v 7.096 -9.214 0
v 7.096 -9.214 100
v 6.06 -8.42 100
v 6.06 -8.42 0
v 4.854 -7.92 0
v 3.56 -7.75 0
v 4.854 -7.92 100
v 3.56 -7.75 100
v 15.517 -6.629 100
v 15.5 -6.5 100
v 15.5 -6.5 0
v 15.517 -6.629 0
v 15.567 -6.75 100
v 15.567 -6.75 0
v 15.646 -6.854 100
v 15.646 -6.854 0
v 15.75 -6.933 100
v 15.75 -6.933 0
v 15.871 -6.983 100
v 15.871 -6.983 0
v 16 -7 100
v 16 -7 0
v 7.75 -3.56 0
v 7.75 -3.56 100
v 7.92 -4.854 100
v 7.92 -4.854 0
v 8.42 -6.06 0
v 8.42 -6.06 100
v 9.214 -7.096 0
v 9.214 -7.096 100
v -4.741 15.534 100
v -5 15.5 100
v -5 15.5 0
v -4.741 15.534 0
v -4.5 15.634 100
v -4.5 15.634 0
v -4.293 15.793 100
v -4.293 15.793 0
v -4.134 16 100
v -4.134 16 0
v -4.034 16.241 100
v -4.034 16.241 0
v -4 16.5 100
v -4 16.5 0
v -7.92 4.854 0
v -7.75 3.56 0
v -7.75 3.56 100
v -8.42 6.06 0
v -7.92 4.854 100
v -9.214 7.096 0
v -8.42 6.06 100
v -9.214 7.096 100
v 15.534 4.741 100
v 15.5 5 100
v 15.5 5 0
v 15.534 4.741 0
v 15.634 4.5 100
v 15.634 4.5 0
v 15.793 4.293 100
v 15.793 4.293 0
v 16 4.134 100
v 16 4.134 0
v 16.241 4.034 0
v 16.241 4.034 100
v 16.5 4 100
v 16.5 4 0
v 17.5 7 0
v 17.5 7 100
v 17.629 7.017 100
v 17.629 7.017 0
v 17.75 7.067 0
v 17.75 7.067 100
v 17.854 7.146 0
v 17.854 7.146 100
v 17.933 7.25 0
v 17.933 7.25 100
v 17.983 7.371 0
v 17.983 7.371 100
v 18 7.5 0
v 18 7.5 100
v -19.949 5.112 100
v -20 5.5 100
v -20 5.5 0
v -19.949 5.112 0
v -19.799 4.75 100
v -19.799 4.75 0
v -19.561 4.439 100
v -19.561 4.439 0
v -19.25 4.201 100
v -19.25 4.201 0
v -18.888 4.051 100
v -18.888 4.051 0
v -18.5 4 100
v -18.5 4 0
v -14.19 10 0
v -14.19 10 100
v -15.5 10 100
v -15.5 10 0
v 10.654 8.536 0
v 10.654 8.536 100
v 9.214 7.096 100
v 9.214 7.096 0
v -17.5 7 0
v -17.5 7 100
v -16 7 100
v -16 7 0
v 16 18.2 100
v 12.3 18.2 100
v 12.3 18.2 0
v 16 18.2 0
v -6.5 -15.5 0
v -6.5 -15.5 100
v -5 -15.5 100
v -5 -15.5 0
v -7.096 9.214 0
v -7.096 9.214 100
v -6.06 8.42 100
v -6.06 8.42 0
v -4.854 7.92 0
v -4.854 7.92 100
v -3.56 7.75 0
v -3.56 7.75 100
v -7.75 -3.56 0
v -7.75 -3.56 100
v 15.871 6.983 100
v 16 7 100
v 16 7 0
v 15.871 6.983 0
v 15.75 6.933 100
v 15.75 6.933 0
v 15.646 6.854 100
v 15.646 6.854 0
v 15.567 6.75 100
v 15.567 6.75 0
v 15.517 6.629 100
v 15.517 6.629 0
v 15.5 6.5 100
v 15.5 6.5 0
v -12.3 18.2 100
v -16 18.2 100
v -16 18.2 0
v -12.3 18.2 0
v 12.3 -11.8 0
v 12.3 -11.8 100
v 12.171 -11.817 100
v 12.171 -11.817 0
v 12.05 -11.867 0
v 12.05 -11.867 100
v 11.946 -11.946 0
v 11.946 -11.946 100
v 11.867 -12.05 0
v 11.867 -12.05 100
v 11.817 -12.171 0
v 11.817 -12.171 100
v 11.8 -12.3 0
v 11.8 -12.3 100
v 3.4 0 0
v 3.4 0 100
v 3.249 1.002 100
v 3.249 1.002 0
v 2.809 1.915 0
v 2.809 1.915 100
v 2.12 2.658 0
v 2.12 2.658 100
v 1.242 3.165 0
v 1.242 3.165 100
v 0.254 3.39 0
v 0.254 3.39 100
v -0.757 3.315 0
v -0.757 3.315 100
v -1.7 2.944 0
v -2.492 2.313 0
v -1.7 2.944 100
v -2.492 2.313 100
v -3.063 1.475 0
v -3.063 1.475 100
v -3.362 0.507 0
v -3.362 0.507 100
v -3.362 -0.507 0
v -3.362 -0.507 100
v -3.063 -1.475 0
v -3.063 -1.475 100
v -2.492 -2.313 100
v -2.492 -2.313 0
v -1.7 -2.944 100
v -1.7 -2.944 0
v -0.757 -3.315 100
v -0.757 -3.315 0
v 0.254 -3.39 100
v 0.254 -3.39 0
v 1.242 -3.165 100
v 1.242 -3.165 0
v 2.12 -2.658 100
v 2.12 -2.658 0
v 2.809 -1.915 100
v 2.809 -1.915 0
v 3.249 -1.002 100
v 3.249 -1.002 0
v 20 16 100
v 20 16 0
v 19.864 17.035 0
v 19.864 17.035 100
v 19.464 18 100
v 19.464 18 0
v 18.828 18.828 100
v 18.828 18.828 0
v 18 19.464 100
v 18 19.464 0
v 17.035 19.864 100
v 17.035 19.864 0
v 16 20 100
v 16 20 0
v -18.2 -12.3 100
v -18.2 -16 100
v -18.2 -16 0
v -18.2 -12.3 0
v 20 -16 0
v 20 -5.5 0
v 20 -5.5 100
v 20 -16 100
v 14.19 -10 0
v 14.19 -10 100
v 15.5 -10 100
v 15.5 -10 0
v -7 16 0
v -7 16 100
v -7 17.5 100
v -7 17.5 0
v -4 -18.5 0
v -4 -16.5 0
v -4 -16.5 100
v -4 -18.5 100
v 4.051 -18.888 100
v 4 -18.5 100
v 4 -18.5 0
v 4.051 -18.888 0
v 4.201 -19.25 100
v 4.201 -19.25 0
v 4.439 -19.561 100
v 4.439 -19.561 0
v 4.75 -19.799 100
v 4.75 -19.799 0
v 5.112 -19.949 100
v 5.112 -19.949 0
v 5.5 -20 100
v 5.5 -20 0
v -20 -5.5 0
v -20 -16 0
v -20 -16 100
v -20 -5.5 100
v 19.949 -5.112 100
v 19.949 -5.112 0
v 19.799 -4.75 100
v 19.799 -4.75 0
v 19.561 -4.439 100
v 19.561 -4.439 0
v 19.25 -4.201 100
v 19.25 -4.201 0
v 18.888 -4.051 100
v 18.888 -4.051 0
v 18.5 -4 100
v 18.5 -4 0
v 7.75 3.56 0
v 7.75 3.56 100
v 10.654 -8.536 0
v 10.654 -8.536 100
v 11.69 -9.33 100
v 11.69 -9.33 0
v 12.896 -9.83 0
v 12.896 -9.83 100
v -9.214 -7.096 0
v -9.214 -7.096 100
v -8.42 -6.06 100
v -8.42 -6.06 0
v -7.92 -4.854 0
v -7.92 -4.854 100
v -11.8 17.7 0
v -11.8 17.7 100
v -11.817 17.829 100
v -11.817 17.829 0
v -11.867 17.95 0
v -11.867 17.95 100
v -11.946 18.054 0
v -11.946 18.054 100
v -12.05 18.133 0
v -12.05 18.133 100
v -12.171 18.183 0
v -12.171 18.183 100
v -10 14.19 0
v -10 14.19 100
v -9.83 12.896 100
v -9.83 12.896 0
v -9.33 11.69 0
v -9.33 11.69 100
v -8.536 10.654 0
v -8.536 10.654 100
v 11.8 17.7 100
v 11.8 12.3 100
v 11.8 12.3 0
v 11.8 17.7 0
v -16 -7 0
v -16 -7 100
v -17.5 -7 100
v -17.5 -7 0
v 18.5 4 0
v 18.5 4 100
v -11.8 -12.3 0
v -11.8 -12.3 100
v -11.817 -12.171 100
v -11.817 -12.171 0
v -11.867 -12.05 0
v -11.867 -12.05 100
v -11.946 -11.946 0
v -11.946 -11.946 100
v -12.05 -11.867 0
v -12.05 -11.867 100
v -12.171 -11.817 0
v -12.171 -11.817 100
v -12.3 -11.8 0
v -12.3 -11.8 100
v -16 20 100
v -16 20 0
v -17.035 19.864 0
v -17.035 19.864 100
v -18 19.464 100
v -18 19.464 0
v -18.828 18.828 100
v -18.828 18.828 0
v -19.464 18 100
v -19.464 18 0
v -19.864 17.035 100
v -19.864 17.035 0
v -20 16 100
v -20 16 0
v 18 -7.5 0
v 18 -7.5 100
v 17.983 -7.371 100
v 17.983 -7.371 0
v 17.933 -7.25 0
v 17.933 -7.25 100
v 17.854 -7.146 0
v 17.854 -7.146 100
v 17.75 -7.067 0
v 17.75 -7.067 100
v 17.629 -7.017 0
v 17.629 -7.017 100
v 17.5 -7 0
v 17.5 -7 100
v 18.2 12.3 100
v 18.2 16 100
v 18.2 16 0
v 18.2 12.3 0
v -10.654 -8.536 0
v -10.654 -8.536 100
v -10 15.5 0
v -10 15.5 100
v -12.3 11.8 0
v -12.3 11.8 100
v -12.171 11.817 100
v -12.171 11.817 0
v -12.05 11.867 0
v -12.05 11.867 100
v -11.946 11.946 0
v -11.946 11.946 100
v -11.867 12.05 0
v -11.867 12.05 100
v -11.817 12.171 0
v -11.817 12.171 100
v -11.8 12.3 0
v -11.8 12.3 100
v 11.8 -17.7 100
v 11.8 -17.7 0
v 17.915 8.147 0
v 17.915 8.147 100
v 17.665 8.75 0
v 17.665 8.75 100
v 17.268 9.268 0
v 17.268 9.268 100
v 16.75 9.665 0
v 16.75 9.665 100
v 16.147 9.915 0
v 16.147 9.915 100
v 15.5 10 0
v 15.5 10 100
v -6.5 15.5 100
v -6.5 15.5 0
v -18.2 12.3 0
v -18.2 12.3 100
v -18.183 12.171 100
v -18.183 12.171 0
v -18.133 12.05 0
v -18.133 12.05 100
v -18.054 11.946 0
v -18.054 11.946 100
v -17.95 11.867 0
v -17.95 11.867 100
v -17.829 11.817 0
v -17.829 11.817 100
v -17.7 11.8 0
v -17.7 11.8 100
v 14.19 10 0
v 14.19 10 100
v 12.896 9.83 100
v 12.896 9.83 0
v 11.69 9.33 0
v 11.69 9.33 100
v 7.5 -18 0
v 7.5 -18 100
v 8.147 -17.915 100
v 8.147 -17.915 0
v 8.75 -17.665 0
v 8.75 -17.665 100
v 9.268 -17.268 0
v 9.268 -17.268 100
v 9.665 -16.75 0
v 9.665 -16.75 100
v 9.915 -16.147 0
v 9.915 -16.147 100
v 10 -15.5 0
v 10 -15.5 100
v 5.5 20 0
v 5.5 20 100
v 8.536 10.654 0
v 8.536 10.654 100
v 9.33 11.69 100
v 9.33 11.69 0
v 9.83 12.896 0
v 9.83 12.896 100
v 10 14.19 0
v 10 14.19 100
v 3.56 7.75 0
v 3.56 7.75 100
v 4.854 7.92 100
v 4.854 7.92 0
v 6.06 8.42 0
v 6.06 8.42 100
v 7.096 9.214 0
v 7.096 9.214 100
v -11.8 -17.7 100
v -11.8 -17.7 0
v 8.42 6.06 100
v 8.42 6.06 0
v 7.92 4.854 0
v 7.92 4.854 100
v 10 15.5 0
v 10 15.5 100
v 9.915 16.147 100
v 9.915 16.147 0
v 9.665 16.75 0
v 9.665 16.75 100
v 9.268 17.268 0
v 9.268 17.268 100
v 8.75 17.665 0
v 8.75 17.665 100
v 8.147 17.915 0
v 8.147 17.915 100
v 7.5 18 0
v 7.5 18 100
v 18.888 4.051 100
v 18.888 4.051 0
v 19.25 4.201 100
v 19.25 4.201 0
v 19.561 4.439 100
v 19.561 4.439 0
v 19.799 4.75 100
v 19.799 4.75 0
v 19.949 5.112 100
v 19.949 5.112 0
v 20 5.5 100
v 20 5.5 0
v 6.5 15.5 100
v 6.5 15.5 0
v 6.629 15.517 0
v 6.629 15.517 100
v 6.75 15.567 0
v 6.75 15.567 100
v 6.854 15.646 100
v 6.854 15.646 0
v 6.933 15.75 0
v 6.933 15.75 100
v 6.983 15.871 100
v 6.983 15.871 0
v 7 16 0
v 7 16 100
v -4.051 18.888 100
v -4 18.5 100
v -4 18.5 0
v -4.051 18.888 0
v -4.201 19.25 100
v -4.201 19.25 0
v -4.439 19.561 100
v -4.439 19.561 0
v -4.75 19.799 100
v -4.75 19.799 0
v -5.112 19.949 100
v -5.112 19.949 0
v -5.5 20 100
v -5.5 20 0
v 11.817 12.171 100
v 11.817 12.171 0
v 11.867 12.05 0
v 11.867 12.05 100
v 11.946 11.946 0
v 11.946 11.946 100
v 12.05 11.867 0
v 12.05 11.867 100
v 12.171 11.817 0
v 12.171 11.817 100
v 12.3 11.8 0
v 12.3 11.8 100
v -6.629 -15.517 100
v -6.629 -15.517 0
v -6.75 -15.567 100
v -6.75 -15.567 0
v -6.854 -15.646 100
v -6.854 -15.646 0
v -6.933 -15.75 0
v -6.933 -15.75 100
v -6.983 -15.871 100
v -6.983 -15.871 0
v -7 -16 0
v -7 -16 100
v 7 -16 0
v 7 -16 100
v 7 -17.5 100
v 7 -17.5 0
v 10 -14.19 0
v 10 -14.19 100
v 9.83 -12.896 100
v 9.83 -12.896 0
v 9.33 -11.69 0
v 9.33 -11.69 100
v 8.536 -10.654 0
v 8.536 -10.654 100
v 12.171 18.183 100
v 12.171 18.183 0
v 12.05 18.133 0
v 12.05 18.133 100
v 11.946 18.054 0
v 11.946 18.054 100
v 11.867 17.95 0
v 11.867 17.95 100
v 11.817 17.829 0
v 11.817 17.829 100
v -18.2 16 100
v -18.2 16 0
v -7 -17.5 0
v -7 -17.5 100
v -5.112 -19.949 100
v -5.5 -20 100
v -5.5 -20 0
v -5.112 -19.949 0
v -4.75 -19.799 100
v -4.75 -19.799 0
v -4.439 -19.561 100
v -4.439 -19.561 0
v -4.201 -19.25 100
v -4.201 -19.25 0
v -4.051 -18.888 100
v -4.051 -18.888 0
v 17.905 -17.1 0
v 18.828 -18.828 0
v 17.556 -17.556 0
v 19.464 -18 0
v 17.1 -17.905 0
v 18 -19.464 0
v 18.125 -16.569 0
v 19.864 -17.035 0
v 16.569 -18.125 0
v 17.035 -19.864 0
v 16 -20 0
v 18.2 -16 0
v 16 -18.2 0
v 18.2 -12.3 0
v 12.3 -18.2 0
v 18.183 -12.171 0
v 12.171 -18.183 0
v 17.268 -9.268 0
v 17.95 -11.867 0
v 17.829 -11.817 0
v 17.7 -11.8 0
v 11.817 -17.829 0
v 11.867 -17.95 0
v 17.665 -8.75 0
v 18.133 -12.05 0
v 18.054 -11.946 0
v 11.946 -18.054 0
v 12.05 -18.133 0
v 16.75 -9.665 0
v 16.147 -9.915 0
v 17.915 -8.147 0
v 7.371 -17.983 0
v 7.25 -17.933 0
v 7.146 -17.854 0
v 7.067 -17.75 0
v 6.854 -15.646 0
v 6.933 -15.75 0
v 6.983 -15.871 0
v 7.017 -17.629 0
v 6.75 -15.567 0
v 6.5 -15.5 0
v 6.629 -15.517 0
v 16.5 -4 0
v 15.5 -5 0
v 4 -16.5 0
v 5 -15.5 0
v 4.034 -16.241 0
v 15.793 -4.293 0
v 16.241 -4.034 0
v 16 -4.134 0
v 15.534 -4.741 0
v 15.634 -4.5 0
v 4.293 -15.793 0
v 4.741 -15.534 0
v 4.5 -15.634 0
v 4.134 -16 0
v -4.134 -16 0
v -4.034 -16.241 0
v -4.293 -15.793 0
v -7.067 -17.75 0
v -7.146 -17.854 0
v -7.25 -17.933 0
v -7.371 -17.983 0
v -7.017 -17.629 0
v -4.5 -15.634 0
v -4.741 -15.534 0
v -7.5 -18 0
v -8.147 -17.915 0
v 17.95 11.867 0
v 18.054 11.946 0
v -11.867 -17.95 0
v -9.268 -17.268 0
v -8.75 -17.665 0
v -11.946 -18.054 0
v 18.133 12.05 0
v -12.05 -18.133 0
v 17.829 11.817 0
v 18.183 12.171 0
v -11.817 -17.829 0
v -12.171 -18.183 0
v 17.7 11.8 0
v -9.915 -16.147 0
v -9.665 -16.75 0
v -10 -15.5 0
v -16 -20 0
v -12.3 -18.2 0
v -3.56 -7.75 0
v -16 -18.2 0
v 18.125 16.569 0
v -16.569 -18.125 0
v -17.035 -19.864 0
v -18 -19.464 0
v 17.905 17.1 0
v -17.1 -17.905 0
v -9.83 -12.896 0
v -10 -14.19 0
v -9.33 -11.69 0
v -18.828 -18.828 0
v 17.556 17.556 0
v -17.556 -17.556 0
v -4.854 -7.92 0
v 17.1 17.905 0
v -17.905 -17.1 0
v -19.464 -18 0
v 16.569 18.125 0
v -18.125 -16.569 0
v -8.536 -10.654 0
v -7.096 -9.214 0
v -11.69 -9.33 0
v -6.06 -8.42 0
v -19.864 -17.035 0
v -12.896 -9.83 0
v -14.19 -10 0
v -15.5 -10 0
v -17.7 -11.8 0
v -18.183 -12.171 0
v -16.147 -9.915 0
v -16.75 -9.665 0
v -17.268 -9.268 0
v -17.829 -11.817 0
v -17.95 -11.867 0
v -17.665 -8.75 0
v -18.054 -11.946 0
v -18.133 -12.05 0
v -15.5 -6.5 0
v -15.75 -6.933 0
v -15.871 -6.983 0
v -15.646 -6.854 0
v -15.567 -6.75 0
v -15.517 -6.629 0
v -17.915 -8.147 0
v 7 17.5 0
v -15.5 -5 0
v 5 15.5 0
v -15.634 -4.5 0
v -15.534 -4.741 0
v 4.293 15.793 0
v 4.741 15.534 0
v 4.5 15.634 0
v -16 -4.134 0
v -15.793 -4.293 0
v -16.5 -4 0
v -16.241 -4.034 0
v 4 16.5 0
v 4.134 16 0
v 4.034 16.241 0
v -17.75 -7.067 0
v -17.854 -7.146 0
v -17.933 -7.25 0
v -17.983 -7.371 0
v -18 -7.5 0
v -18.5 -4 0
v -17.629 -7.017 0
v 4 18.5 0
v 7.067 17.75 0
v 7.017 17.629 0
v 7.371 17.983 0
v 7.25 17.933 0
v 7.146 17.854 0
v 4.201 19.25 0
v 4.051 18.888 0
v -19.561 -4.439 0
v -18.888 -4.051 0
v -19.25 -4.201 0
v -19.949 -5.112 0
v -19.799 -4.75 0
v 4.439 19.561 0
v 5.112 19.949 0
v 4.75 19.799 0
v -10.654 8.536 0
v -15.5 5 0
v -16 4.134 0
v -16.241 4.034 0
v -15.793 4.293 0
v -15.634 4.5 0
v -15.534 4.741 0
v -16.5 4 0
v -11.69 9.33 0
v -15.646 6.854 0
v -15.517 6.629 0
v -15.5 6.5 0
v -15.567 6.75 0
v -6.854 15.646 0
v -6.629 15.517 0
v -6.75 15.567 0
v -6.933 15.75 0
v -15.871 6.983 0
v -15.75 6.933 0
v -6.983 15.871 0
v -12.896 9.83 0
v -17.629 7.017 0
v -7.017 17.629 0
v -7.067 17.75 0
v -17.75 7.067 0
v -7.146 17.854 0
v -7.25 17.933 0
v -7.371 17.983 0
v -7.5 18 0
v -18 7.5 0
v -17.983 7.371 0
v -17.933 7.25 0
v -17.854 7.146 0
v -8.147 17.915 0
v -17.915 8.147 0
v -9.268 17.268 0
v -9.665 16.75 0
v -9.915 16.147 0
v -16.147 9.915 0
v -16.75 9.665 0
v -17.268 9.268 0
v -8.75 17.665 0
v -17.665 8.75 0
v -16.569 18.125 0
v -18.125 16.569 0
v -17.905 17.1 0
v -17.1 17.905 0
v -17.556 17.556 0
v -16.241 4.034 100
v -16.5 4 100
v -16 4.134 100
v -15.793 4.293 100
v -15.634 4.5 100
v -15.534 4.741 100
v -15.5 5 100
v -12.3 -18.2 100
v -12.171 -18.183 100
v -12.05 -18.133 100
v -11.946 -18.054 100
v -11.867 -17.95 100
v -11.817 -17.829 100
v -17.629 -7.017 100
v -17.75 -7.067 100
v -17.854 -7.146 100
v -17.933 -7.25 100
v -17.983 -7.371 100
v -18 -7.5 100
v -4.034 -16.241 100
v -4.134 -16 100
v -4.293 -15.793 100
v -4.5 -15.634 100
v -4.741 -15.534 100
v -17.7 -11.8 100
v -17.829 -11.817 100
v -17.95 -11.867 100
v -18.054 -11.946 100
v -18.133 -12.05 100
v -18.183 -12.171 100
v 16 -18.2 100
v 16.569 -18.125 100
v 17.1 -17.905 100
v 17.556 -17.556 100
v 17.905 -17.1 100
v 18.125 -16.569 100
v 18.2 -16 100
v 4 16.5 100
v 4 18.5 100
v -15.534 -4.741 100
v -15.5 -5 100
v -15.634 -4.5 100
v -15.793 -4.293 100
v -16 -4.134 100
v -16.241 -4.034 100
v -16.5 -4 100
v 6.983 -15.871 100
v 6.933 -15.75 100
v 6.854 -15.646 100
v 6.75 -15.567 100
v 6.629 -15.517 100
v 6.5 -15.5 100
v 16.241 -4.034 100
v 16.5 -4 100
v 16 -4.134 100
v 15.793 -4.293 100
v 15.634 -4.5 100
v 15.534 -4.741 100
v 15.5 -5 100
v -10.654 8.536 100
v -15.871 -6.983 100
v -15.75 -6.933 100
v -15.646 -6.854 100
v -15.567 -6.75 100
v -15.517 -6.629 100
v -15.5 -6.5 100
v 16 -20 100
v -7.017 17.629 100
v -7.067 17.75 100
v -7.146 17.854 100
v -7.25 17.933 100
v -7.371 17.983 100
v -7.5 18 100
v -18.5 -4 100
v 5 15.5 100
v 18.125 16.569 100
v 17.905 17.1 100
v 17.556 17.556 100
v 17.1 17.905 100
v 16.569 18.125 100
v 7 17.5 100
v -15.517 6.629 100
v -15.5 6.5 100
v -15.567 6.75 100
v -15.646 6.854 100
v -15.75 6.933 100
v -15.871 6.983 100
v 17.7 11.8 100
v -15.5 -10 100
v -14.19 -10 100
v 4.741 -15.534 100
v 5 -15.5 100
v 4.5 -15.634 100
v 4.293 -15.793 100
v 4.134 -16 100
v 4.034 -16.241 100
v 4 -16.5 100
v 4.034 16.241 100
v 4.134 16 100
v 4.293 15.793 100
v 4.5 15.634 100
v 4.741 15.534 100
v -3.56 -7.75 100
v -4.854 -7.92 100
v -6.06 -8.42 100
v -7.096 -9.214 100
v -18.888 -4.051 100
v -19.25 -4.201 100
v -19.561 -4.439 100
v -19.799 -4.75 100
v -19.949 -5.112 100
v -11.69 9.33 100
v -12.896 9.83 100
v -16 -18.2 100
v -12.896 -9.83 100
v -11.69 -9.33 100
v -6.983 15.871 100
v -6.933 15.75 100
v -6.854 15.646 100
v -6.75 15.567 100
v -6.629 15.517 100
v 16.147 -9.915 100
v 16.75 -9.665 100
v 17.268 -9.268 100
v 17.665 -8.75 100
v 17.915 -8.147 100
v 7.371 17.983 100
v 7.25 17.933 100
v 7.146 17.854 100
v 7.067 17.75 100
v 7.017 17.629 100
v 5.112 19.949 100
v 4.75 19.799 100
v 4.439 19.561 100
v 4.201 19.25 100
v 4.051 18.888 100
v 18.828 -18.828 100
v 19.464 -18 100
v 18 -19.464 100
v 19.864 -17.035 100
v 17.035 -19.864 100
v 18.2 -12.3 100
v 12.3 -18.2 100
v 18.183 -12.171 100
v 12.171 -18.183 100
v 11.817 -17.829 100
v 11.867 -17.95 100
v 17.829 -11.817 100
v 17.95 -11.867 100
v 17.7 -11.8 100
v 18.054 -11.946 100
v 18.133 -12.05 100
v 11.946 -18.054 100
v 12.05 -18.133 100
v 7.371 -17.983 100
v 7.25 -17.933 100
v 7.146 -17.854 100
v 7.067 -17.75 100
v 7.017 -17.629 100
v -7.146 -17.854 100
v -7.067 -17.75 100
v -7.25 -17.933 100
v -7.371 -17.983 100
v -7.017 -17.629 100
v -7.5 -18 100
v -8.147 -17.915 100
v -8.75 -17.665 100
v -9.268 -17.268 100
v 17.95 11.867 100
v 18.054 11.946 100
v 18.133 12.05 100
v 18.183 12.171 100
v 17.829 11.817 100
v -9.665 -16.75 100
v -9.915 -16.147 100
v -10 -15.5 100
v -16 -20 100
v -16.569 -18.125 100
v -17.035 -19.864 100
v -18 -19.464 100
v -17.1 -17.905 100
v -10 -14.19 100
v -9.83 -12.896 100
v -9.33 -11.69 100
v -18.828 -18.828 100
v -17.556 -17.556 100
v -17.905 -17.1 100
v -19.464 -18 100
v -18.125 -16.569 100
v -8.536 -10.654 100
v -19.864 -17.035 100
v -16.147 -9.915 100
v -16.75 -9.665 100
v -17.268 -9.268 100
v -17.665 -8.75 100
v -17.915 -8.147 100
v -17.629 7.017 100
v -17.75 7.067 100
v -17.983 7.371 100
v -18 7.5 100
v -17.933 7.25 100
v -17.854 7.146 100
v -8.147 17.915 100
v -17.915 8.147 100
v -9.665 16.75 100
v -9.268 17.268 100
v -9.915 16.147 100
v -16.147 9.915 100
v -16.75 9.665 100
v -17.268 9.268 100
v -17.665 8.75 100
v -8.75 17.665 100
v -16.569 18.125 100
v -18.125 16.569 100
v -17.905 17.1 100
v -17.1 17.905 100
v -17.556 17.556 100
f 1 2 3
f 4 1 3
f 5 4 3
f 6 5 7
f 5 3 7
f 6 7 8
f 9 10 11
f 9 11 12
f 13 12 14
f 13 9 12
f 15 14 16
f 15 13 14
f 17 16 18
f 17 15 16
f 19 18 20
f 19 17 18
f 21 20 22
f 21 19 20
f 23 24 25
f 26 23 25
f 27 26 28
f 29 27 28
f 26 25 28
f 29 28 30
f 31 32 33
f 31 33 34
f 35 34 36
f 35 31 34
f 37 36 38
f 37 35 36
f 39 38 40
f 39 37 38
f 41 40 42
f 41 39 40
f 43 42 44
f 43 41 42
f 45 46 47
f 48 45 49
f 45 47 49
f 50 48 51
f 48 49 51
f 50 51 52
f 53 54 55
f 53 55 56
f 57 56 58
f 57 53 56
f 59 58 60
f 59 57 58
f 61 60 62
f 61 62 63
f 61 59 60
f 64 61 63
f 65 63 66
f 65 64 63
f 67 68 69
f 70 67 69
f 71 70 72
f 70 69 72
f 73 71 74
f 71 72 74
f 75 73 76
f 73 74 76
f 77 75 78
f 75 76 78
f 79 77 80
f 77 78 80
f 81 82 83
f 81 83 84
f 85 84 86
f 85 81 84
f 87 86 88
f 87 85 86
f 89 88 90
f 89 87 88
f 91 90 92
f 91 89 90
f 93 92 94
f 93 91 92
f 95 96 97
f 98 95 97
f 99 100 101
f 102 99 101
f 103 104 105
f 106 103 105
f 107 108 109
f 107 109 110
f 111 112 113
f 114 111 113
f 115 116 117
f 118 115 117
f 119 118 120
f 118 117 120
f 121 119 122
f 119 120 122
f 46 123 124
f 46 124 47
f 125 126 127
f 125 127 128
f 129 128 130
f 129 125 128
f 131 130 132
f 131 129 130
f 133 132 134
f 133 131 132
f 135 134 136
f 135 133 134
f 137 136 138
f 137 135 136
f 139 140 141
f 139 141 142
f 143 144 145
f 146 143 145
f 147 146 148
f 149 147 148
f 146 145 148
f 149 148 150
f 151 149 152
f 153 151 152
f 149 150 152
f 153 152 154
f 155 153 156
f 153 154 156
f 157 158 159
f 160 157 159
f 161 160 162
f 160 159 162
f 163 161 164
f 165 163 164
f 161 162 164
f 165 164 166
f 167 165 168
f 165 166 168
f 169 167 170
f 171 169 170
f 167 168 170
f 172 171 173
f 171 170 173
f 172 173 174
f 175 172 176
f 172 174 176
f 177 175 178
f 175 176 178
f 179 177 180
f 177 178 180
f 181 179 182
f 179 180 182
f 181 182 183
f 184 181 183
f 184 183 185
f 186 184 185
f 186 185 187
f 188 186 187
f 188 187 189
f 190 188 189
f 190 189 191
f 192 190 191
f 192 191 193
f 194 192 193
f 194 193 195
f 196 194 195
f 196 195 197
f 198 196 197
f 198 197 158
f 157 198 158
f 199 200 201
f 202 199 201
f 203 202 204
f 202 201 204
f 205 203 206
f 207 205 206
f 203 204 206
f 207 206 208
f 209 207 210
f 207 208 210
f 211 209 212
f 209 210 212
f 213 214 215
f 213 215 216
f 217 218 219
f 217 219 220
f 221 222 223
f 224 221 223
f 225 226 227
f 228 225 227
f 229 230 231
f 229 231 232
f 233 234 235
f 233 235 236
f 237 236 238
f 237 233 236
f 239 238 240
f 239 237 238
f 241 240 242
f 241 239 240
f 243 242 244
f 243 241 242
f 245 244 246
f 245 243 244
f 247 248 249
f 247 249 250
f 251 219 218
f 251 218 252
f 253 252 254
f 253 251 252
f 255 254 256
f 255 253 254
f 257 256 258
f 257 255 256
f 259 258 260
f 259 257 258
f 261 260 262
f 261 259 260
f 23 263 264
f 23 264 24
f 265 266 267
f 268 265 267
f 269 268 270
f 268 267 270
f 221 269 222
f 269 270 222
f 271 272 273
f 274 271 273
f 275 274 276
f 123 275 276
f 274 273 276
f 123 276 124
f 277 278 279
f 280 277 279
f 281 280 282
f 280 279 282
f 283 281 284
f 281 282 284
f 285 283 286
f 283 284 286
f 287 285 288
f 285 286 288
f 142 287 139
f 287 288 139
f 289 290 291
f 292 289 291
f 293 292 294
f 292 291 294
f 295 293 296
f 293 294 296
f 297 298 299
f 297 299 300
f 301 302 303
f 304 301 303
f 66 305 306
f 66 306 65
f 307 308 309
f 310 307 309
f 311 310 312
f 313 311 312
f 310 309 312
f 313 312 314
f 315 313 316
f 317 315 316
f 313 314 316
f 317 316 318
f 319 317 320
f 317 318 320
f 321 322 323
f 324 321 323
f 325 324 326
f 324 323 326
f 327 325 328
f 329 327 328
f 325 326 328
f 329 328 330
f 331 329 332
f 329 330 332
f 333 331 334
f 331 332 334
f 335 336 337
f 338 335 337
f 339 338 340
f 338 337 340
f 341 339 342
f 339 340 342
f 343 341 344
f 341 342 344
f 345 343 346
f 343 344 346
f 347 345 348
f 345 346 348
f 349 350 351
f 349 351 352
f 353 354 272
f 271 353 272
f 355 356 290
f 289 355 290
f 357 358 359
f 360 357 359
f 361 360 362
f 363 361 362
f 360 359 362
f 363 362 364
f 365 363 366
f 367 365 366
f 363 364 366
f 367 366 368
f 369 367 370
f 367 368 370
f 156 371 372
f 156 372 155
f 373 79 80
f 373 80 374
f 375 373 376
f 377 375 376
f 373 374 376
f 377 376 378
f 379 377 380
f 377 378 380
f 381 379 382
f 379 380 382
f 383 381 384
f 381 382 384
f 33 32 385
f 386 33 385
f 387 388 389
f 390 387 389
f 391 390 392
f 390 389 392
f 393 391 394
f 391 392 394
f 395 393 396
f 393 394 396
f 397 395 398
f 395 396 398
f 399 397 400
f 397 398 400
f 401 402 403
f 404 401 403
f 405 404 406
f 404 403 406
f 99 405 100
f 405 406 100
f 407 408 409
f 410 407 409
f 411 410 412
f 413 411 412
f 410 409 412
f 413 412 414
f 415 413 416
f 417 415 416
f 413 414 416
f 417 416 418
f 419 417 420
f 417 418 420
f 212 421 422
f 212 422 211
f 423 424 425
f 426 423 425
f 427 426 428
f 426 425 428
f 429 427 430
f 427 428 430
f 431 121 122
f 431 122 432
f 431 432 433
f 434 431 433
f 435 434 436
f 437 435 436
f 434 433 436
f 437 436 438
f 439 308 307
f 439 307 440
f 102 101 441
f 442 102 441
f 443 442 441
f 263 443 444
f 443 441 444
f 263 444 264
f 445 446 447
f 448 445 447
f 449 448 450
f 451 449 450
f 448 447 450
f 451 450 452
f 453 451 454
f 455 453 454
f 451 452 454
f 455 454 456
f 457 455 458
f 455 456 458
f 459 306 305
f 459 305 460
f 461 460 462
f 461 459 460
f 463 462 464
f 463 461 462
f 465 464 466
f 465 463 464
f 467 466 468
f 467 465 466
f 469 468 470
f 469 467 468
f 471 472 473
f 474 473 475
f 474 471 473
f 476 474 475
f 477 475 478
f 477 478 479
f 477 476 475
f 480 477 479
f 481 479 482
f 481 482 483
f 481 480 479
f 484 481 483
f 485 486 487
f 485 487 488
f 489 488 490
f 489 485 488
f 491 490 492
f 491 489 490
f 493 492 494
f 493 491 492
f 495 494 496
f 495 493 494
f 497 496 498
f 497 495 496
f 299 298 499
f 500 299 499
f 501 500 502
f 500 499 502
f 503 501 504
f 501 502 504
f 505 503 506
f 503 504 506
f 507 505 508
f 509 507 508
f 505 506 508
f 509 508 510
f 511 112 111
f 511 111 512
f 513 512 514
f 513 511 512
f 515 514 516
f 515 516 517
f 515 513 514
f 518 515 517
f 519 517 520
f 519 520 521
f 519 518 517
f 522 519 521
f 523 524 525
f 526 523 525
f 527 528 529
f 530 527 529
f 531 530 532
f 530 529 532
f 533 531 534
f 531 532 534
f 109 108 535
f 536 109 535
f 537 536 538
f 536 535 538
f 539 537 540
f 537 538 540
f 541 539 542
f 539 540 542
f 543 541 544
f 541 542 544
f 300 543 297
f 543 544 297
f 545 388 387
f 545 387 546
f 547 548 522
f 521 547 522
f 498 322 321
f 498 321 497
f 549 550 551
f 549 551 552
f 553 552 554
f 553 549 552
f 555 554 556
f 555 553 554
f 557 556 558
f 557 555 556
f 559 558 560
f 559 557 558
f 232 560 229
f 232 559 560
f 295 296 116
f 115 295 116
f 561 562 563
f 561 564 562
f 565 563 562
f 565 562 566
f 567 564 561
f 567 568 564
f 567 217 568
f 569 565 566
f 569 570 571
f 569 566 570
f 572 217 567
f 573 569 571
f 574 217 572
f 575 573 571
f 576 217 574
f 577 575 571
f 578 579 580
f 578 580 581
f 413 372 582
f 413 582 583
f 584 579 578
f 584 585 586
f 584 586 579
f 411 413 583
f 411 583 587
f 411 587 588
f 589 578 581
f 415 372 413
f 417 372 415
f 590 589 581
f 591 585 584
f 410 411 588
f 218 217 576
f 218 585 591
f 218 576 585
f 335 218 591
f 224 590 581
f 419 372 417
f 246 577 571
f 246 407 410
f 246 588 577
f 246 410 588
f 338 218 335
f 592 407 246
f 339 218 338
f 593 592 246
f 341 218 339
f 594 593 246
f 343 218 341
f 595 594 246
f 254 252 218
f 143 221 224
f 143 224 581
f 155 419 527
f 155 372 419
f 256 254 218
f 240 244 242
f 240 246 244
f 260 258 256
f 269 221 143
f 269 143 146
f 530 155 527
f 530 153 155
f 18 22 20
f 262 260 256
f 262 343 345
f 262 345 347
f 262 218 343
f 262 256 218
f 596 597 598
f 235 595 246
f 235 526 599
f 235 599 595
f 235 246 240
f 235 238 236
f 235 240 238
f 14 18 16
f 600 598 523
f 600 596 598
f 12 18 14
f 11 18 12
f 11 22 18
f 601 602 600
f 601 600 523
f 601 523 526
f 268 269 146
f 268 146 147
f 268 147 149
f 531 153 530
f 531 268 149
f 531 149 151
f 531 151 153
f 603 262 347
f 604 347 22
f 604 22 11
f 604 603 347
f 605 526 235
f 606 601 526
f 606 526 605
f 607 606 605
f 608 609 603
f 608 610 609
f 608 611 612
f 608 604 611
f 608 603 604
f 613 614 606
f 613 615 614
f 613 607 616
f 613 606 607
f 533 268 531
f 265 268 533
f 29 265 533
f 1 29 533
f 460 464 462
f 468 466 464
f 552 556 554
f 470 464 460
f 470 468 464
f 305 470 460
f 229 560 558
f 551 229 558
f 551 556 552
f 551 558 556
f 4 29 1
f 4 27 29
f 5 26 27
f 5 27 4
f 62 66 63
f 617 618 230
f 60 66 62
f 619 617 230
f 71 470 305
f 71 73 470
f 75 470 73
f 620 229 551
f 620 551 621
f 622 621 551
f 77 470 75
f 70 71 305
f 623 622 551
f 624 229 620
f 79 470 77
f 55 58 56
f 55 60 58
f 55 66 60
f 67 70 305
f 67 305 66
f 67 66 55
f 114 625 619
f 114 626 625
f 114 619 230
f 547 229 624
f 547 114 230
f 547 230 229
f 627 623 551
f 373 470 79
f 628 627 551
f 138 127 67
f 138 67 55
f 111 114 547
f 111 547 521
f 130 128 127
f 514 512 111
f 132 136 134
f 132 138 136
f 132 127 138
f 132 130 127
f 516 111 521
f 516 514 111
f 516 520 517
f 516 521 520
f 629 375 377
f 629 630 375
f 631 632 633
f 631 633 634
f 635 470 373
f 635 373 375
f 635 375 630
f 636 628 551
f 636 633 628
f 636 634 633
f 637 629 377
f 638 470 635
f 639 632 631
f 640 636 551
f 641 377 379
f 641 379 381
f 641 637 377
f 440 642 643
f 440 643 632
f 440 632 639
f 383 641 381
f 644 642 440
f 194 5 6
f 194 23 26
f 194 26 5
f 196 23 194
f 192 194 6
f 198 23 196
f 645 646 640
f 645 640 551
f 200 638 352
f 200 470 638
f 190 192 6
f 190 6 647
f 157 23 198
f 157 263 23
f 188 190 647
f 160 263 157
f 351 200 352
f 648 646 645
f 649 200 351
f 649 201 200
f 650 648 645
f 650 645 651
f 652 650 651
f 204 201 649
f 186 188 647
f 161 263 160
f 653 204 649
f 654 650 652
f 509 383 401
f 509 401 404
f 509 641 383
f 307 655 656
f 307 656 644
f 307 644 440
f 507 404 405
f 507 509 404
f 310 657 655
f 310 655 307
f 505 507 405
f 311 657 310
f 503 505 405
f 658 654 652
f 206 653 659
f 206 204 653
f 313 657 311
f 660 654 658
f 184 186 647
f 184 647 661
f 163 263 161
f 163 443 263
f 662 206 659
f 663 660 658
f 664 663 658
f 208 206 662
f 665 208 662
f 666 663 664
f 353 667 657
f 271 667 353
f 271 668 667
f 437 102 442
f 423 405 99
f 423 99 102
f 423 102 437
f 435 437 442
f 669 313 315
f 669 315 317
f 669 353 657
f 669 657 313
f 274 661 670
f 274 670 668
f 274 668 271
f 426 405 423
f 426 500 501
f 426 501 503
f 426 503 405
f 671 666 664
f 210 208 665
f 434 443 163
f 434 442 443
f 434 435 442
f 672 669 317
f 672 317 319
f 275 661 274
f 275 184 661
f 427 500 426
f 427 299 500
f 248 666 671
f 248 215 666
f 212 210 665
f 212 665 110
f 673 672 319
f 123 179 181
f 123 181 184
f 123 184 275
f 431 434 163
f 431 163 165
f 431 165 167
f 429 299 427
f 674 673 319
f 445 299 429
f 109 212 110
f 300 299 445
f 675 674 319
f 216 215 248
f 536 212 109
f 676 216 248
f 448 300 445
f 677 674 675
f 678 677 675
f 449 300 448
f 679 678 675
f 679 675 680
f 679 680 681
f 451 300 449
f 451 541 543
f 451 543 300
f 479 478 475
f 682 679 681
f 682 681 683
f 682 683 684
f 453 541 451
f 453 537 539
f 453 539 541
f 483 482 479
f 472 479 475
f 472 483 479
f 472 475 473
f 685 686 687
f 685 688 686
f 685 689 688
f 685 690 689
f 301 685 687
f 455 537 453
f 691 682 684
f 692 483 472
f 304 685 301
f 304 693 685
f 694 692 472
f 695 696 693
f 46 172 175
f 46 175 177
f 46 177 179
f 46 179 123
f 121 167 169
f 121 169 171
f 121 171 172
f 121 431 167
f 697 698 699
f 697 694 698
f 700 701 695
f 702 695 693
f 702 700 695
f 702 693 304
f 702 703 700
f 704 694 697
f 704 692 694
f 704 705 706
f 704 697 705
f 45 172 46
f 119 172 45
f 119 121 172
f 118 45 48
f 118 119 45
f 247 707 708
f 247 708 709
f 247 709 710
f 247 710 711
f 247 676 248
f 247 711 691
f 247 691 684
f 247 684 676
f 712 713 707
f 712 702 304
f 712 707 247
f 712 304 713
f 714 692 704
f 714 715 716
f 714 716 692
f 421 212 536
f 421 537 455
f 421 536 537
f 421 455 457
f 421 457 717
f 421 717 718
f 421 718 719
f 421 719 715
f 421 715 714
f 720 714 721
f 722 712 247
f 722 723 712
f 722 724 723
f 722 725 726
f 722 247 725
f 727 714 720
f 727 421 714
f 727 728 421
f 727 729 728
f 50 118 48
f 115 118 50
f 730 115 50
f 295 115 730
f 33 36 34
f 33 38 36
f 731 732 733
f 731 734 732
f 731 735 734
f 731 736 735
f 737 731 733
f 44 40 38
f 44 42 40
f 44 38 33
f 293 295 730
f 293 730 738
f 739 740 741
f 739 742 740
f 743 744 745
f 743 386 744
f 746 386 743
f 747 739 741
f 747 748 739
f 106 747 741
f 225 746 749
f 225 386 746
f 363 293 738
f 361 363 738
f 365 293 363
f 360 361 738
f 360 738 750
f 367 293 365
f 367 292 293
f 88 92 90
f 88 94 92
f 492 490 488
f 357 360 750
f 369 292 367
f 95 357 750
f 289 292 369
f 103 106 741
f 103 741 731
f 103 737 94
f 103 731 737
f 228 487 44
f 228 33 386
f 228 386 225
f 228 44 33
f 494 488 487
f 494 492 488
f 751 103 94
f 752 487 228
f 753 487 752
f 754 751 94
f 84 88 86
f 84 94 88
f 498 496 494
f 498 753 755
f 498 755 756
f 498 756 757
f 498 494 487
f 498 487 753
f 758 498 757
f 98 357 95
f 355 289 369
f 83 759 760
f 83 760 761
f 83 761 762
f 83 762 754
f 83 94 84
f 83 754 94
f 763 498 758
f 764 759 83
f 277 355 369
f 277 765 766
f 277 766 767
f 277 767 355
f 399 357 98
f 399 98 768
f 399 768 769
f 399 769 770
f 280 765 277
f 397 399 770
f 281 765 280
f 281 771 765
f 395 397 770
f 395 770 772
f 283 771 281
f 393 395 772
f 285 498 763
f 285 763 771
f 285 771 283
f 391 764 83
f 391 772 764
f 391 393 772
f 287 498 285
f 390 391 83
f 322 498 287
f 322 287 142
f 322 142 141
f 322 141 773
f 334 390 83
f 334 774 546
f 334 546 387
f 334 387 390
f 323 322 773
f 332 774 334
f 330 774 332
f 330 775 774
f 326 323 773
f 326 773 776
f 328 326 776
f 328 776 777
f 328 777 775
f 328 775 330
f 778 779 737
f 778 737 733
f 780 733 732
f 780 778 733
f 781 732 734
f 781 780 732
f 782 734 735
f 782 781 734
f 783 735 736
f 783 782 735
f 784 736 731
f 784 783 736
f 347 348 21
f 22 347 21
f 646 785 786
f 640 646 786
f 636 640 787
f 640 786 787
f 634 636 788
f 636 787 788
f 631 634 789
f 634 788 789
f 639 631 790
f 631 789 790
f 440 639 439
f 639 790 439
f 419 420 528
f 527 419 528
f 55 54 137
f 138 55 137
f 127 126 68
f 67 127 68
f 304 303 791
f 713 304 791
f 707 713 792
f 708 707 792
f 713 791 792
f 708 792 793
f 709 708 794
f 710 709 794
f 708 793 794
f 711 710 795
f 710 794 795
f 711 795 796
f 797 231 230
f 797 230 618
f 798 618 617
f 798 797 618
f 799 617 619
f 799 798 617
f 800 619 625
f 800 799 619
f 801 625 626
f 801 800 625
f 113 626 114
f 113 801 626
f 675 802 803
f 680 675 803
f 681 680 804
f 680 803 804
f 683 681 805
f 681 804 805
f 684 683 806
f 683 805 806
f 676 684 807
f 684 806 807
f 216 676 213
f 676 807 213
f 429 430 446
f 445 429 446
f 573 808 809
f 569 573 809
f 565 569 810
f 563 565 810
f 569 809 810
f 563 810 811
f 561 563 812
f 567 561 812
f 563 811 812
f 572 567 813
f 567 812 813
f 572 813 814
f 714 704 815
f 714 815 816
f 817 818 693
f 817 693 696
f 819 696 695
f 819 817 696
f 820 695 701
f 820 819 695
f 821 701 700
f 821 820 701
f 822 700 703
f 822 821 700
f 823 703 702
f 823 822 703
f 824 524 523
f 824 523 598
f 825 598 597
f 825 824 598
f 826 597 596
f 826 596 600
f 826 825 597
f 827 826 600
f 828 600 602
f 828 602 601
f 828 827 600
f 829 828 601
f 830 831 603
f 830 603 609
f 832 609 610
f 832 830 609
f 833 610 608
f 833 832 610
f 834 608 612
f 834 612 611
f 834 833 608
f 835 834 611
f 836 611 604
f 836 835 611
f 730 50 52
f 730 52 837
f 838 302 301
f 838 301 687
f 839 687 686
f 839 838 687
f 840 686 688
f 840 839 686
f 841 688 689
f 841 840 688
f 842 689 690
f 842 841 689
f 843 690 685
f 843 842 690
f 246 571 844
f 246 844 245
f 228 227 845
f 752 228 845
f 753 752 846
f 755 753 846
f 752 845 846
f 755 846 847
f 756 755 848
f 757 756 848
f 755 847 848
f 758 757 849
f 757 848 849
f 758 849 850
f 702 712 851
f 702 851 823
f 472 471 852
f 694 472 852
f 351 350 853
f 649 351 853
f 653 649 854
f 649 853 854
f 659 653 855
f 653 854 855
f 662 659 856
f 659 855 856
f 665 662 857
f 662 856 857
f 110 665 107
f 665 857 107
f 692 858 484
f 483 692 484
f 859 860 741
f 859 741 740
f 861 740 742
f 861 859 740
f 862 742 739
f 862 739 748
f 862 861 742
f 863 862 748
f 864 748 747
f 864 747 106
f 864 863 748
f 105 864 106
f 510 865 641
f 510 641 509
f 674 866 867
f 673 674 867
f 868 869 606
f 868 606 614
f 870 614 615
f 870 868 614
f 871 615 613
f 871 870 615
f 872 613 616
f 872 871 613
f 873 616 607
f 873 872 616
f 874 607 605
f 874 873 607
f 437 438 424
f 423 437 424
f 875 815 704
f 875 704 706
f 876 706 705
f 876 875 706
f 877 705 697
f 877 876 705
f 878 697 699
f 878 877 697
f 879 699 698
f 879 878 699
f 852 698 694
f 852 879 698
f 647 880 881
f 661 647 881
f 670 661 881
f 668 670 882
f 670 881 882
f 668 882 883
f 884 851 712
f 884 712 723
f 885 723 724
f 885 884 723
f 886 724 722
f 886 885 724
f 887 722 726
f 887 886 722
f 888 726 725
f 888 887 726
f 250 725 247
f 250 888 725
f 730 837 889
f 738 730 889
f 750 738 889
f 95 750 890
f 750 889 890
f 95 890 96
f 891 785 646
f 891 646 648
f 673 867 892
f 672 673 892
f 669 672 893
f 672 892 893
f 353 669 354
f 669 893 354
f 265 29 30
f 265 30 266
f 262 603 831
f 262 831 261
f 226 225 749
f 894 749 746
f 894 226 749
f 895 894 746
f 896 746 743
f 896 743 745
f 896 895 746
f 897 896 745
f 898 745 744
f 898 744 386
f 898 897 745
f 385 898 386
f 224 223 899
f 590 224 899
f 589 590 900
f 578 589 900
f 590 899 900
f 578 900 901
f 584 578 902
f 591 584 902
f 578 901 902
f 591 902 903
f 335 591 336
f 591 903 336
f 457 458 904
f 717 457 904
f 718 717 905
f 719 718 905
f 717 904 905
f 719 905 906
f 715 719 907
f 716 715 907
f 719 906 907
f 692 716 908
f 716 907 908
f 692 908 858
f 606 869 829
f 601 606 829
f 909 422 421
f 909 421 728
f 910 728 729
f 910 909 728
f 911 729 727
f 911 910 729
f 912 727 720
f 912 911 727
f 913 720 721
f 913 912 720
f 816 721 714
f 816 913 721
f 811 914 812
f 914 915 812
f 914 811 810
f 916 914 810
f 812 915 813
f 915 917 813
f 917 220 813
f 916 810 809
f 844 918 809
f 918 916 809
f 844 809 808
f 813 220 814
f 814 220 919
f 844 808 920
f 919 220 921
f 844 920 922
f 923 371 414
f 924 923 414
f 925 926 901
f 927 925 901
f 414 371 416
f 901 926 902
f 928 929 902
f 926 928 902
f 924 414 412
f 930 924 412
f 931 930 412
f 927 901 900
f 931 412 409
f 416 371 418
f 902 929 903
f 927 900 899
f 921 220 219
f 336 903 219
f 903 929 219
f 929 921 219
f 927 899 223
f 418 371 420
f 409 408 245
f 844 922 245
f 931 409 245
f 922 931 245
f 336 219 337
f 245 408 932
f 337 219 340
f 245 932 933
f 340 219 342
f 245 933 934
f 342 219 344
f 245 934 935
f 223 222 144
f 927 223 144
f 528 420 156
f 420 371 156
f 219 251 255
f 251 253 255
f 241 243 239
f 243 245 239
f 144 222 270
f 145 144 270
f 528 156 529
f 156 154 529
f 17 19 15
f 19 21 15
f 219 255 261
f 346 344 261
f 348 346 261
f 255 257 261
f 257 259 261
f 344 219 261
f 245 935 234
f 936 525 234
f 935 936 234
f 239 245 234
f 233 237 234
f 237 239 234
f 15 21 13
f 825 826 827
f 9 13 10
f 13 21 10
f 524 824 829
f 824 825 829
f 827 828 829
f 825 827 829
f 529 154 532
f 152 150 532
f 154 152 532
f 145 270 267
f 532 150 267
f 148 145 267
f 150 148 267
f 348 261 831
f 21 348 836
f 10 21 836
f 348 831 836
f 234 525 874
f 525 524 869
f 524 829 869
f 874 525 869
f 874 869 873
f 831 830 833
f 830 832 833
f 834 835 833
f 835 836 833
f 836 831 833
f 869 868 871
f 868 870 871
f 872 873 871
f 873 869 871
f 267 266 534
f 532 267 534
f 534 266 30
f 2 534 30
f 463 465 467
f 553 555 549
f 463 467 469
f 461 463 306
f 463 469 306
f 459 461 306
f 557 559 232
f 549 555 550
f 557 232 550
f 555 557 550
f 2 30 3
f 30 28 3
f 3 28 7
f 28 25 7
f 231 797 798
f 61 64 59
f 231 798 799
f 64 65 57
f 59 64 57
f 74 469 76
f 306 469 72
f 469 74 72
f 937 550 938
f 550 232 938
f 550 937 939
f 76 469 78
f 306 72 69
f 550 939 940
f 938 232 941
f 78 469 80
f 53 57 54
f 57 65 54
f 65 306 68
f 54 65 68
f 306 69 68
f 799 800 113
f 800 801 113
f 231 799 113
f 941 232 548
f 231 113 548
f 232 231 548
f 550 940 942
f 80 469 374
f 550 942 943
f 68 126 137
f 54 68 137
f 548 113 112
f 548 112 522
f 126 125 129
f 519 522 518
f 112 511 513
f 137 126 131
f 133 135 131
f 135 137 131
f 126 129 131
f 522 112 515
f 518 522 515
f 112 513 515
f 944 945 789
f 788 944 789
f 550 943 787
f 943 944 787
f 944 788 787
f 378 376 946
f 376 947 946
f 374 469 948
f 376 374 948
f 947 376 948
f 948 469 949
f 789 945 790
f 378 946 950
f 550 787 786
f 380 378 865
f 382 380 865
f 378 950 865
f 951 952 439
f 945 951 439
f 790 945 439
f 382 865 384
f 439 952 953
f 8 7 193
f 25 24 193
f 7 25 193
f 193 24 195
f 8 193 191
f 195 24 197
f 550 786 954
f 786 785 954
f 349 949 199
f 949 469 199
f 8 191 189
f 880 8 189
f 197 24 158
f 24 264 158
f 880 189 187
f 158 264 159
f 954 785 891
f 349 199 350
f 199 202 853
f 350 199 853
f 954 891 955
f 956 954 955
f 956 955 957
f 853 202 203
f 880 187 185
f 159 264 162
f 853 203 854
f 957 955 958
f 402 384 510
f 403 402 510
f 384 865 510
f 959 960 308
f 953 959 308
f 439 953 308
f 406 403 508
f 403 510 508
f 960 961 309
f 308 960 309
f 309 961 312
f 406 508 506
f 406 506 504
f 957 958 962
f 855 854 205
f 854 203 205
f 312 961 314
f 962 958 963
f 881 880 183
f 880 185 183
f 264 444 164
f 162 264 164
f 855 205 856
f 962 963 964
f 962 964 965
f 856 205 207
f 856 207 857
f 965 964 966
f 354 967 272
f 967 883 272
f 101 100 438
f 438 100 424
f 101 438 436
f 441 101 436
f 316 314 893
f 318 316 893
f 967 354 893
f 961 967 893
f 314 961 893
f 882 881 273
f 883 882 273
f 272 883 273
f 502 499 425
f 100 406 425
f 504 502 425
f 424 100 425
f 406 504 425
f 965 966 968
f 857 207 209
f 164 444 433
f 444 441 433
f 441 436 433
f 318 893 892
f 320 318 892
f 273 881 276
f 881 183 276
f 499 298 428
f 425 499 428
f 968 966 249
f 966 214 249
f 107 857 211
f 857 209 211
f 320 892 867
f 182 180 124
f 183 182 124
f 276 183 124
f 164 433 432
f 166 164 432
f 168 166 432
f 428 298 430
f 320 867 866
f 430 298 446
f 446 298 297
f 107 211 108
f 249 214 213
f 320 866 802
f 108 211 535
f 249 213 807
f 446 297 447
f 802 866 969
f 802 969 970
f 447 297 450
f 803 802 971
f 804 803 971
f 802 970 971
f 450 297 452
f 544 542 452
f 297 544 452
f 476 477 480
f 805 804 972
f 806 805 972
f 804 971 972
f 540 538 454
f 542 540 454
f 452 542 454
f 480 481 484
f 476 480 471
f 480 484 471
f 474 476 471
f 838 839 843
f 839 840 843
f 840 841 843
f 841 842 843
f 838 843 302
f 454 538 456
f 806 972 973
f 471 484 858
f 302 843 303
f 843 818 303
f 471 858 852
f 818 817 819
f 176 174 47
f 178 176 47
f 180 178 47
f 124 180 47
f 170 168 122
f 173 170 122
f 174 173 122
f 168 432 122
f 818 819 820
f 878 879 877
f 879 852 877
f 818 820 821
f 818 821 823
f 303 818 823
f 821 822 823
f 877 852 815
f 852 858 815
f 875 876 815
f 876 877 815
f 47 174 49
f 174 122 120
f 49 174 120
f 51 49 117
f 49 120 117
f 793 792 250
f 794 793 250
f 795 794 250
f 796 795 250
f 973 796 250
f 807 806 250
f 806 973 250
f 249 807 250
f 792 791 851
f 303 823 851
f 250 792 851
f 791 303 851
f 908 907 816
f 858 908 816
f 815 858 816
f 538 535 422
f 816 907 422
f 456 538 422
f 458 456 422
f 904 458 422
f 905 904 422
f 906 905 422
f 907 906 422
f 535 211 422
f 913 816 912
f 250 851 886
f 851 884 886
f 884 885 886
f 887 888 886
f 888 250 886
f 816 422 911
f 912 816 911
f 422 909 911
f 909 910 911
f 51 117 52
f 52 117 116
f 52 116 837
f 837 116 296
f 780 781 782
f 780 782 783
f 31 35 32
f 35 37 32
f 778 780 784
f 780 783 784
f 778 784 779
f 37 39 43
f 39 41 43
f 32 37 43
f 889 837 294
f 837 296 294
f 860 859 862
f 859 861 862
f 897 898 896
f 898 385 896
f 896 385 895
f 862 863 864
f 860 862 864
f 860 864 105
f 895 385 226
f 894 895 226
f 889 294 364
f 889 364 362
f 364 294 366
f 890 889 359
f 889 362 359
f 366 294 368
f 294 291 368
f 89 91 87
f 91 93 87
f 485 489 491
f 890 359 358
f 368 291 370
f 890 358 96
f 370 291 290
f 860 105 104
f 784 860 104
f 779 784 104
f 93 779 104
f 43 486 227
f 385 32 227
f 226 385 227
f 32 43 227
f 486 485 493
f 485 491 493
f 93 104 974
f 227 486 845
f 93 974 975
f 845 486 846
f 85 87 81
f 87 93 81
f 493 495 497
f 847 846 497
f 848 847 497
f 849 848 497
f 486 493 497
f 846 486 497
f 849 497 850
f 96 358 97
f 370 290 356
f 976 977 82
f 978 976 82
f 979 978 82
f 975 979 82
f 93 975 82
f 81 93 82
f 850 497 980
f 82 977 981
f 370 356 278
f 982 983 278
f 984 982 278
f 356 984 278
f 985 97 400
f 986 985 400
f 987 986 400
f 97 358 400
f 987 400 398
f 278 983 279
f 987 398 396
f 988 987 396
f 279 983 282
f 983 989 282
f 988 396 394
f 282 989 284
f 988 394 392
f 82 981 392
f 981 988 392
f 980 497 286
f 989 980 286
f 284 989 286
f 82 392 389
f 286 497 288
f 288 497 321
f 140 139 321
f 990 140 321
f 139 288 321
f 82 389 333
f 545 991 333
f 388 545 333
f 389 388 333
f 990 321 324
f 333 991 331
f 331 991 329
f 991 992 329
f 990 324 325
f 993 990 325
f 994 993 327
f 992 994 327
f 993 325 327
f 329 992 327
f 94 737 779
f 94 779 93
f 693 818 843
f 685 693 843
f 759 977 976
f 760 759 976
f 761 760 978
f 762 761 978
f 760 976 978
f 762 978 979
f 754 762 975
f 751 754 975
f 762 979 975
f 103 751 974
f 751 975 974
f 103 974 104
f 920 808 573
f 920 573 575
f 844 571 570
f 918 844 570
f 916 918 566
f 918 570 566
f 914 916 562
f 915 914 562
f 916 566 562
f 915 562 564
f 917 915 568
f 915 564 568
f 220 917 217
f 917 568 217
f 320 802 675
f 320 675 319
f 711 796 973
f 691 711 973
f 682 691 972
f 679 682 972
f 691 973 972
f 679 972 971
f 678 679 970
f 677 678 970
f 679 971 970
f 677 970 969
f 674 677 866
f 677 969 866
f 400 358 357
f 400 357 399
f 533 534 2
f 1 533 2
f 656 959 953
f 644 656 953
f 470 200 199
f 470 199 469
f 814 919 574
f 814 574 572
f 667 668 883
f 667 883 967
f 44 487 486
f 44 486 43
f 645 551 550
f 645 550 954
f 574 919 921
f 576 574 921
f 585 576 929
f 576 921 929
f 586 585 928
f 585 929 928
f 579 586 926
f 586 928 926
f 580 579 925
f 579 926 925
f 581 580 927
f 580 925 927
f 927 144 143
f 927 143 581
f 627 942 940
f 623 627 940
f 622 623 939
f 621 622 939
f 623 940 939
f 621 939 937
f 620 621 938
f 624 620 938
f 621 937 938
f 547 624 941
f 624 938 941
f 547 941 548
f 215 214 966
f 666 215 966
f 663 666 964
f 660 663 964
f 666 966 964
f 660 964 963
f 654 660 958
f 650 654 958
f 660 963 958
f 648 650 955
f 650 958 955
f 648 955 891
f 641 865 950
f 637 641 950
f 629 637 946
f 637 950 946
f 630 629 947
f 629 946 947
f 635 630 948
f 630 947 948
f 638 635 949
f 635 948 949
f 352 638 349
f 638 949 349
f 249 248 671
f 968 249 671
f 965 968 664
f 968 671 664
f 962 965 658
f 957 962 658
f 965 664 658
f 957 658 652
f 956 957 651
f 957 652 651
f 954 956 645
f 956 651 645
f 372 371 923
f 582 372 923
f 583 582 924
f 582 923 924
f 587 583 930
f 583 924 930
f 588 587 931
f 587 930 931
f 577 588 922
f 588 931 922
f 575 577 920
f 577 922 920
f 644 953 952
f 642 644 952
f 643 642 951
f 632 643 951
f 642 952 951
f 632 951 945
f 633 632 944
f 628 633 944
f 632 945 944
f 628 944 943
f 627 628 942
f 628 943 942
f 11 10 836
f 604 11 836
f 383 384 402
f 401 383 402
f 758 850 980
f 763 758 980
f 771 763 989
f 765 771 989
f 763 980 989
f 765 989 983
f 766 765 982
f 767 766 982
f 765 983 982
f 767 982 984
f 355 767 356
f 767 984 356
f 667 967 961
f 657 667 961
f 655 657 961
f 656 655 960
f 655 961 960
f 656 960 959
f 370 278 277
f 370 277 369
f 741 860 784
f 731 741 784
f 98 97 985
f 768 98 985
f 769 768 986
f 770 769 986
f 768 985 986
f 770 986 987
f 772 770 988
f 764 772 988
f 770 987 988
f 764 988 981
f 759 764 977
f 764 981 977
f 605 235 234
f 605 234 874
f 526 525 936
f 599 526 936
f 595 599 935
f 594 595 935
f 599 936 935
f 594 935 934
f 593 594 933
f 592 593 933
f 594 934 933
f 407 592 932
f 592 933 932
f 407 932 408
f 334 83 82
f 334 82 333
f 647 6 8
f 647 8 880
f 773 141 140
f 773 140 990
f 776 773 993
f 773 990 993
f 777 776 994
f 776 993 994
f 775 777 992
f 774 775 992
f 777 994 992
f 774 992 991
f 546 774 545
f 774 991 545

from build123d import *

# Parameters (mm, degrees)
PAD_DEPTH          = 100
POCKET_DEPTH       = 329.783506
POLARPATTERN_COUNT = 4
SKETCH002_R        = 3.4
POCKET001_DEPTH    = 100.001


with BuildPart() as part:
    # Sketch → Pad (new body)
    with BuildSketch(Plane.XY):
        with BuildLine():
            Line((-16, 20), (16, 20))
            ThreePointArc((20, 16), (18.828427, 18.828427), (16, 20))
            Line((20, 16), (20, -16))
            ThreePointArc((16, -20), (18.828427, -18.828427), (20, -16))
            Line((16, -20), (-16, -20))
            ThreePointArc((-20, -16), (-18.828427, -18.828427), (-16, -20))
            Line((-20, -16), (-20, 16))
            ThreePointArc((-16, 20), (-18.828427, 18.828427), (-20, 16))
        make_face()
    extrude(amount=PAD_DEPTH)

    # Sketch001 (on Face10 of Pad) → Pocket (cut, through all)
    with BuildSketch(Plane.XY.offset(100)):
        with BuildLine():
            Line((-16, 18.2), (-12.3, 18.2))
            ThreePointArc((-11.8, 17.7), (-11.946447, 18.053553), (-12.3, 18.2))
            Line((-11.8, 17.7), (-11.8, 12.3))
            ThreePointArc((-12.3, 11.8), (-11.946447, 11.946447), (-11.8, 12.3))
            Line((-12.3, 11.8), (-17.7, 11.8))
            ThreePointArc((-18.2, 12.3), (-18.053553, 11.946447), (-17.7, 11.8))
            Line((-18.2, 12.3), (-18.2, 16))
            ThreePointArc((-16, 18.2), (-17.555635, 17.555635), (-18.2, 16))
        make_face()
        with BuildLine():
            ThreePointArc((-4, 18.5), (-4.43934, 19.56066), (-5.5, 20))
            Line((5.5, 20), (-5.5, 20))
            ThreePointArc((5.5, 20), (4.43934, 19.56066), (4, 18.5))
            Line((4, 16.5), (4, 18.5))
            ThreePointArc((4, 16.5), (4.292893, 15.792893), (5, 15.5))
            Line((6.5, 15.5), (5, 15.5))
            ThreePointArc((6.5, 15.5), (6.853553, 15.646447), (7, 16))
            Line((7, 17.5), (7, 16))
            ThreePointArc((7.5, 18), (7.146447, 17.853553), (7, 17.5))
            ThreePointArc((10, 15.5), (9.267767, 17.267767), (7.5, 18))
            Line((10, 14.19), (10, 15.5))
            ThreePointArc((8.535534, 10.654466), (9.619398, 12.276583), (10, 14.19))
            Line((7.095534, 9.214466), (8.535534, 10.654466))
            ThreePointArc((3.56, 7.75), (5.473417, 8.130602), (7.095534, 9.214466))
            Line((-3.56, 7.75), (3.56, 7.75))
            ThreePointArc((-7.095534, 9.214466), (-5.473417, 8.130602), (-3.56, 7.75))
            Line((-8.535534, 10.654466), (-7.095534, 9.214466))
            ThreePointArc((-10, 14.19), (-9.619398, 12.276583), (-8.535534, 10.654466))
            Line((-10, 15.5), (-10, 14.19))
            ThreePointArc((-7.5, 18), (-9.267767, 17.267767), (-10, 15.5))
            ThreePointArc((-7, 17.5), (-7.146447, 17.853553), (-7.5, 18))
            Line((-7, 16), (-7, 17.5))
            ThreePointArc((-7, 16), (-6.853553, 15.646447), (-6.5, 15.5))
            Line((-5, 15.5), (-6.5, 15.5))
            ThreePointArc((-5, 15.5), (-4.292893, 15.792893), (-4, 16.5))
            Line((-4, 18.5), (-4, 16.5))
        make_face()
    pocket = extrude(amount=-POCKET_DEPTH, mode=Mode.SUBTRACT)

    # PolarPattern: Pocket ×4 about axis
    polarpattern_axis = Axis((0, 0, 100), (0, 0, 1))
    for i in range(1, POLARPATTERN_COUNT):
        add(pocket.rotate(polarpattern_axis, i * 360 / POLARPATTERN_COUNT), mode=Mode.SUBTRACT)

    # Sketch002 (on Face4 of PolarPattern) → Pocket001 (cut, through all)
    with BuildSketch(Plane.XY.offset(100)):
        Circle(SKETCH002_R)
    extrude(amount=-POCKET001_DEPTH, mode=Mode.SUBTRACT)


solid = part.part
